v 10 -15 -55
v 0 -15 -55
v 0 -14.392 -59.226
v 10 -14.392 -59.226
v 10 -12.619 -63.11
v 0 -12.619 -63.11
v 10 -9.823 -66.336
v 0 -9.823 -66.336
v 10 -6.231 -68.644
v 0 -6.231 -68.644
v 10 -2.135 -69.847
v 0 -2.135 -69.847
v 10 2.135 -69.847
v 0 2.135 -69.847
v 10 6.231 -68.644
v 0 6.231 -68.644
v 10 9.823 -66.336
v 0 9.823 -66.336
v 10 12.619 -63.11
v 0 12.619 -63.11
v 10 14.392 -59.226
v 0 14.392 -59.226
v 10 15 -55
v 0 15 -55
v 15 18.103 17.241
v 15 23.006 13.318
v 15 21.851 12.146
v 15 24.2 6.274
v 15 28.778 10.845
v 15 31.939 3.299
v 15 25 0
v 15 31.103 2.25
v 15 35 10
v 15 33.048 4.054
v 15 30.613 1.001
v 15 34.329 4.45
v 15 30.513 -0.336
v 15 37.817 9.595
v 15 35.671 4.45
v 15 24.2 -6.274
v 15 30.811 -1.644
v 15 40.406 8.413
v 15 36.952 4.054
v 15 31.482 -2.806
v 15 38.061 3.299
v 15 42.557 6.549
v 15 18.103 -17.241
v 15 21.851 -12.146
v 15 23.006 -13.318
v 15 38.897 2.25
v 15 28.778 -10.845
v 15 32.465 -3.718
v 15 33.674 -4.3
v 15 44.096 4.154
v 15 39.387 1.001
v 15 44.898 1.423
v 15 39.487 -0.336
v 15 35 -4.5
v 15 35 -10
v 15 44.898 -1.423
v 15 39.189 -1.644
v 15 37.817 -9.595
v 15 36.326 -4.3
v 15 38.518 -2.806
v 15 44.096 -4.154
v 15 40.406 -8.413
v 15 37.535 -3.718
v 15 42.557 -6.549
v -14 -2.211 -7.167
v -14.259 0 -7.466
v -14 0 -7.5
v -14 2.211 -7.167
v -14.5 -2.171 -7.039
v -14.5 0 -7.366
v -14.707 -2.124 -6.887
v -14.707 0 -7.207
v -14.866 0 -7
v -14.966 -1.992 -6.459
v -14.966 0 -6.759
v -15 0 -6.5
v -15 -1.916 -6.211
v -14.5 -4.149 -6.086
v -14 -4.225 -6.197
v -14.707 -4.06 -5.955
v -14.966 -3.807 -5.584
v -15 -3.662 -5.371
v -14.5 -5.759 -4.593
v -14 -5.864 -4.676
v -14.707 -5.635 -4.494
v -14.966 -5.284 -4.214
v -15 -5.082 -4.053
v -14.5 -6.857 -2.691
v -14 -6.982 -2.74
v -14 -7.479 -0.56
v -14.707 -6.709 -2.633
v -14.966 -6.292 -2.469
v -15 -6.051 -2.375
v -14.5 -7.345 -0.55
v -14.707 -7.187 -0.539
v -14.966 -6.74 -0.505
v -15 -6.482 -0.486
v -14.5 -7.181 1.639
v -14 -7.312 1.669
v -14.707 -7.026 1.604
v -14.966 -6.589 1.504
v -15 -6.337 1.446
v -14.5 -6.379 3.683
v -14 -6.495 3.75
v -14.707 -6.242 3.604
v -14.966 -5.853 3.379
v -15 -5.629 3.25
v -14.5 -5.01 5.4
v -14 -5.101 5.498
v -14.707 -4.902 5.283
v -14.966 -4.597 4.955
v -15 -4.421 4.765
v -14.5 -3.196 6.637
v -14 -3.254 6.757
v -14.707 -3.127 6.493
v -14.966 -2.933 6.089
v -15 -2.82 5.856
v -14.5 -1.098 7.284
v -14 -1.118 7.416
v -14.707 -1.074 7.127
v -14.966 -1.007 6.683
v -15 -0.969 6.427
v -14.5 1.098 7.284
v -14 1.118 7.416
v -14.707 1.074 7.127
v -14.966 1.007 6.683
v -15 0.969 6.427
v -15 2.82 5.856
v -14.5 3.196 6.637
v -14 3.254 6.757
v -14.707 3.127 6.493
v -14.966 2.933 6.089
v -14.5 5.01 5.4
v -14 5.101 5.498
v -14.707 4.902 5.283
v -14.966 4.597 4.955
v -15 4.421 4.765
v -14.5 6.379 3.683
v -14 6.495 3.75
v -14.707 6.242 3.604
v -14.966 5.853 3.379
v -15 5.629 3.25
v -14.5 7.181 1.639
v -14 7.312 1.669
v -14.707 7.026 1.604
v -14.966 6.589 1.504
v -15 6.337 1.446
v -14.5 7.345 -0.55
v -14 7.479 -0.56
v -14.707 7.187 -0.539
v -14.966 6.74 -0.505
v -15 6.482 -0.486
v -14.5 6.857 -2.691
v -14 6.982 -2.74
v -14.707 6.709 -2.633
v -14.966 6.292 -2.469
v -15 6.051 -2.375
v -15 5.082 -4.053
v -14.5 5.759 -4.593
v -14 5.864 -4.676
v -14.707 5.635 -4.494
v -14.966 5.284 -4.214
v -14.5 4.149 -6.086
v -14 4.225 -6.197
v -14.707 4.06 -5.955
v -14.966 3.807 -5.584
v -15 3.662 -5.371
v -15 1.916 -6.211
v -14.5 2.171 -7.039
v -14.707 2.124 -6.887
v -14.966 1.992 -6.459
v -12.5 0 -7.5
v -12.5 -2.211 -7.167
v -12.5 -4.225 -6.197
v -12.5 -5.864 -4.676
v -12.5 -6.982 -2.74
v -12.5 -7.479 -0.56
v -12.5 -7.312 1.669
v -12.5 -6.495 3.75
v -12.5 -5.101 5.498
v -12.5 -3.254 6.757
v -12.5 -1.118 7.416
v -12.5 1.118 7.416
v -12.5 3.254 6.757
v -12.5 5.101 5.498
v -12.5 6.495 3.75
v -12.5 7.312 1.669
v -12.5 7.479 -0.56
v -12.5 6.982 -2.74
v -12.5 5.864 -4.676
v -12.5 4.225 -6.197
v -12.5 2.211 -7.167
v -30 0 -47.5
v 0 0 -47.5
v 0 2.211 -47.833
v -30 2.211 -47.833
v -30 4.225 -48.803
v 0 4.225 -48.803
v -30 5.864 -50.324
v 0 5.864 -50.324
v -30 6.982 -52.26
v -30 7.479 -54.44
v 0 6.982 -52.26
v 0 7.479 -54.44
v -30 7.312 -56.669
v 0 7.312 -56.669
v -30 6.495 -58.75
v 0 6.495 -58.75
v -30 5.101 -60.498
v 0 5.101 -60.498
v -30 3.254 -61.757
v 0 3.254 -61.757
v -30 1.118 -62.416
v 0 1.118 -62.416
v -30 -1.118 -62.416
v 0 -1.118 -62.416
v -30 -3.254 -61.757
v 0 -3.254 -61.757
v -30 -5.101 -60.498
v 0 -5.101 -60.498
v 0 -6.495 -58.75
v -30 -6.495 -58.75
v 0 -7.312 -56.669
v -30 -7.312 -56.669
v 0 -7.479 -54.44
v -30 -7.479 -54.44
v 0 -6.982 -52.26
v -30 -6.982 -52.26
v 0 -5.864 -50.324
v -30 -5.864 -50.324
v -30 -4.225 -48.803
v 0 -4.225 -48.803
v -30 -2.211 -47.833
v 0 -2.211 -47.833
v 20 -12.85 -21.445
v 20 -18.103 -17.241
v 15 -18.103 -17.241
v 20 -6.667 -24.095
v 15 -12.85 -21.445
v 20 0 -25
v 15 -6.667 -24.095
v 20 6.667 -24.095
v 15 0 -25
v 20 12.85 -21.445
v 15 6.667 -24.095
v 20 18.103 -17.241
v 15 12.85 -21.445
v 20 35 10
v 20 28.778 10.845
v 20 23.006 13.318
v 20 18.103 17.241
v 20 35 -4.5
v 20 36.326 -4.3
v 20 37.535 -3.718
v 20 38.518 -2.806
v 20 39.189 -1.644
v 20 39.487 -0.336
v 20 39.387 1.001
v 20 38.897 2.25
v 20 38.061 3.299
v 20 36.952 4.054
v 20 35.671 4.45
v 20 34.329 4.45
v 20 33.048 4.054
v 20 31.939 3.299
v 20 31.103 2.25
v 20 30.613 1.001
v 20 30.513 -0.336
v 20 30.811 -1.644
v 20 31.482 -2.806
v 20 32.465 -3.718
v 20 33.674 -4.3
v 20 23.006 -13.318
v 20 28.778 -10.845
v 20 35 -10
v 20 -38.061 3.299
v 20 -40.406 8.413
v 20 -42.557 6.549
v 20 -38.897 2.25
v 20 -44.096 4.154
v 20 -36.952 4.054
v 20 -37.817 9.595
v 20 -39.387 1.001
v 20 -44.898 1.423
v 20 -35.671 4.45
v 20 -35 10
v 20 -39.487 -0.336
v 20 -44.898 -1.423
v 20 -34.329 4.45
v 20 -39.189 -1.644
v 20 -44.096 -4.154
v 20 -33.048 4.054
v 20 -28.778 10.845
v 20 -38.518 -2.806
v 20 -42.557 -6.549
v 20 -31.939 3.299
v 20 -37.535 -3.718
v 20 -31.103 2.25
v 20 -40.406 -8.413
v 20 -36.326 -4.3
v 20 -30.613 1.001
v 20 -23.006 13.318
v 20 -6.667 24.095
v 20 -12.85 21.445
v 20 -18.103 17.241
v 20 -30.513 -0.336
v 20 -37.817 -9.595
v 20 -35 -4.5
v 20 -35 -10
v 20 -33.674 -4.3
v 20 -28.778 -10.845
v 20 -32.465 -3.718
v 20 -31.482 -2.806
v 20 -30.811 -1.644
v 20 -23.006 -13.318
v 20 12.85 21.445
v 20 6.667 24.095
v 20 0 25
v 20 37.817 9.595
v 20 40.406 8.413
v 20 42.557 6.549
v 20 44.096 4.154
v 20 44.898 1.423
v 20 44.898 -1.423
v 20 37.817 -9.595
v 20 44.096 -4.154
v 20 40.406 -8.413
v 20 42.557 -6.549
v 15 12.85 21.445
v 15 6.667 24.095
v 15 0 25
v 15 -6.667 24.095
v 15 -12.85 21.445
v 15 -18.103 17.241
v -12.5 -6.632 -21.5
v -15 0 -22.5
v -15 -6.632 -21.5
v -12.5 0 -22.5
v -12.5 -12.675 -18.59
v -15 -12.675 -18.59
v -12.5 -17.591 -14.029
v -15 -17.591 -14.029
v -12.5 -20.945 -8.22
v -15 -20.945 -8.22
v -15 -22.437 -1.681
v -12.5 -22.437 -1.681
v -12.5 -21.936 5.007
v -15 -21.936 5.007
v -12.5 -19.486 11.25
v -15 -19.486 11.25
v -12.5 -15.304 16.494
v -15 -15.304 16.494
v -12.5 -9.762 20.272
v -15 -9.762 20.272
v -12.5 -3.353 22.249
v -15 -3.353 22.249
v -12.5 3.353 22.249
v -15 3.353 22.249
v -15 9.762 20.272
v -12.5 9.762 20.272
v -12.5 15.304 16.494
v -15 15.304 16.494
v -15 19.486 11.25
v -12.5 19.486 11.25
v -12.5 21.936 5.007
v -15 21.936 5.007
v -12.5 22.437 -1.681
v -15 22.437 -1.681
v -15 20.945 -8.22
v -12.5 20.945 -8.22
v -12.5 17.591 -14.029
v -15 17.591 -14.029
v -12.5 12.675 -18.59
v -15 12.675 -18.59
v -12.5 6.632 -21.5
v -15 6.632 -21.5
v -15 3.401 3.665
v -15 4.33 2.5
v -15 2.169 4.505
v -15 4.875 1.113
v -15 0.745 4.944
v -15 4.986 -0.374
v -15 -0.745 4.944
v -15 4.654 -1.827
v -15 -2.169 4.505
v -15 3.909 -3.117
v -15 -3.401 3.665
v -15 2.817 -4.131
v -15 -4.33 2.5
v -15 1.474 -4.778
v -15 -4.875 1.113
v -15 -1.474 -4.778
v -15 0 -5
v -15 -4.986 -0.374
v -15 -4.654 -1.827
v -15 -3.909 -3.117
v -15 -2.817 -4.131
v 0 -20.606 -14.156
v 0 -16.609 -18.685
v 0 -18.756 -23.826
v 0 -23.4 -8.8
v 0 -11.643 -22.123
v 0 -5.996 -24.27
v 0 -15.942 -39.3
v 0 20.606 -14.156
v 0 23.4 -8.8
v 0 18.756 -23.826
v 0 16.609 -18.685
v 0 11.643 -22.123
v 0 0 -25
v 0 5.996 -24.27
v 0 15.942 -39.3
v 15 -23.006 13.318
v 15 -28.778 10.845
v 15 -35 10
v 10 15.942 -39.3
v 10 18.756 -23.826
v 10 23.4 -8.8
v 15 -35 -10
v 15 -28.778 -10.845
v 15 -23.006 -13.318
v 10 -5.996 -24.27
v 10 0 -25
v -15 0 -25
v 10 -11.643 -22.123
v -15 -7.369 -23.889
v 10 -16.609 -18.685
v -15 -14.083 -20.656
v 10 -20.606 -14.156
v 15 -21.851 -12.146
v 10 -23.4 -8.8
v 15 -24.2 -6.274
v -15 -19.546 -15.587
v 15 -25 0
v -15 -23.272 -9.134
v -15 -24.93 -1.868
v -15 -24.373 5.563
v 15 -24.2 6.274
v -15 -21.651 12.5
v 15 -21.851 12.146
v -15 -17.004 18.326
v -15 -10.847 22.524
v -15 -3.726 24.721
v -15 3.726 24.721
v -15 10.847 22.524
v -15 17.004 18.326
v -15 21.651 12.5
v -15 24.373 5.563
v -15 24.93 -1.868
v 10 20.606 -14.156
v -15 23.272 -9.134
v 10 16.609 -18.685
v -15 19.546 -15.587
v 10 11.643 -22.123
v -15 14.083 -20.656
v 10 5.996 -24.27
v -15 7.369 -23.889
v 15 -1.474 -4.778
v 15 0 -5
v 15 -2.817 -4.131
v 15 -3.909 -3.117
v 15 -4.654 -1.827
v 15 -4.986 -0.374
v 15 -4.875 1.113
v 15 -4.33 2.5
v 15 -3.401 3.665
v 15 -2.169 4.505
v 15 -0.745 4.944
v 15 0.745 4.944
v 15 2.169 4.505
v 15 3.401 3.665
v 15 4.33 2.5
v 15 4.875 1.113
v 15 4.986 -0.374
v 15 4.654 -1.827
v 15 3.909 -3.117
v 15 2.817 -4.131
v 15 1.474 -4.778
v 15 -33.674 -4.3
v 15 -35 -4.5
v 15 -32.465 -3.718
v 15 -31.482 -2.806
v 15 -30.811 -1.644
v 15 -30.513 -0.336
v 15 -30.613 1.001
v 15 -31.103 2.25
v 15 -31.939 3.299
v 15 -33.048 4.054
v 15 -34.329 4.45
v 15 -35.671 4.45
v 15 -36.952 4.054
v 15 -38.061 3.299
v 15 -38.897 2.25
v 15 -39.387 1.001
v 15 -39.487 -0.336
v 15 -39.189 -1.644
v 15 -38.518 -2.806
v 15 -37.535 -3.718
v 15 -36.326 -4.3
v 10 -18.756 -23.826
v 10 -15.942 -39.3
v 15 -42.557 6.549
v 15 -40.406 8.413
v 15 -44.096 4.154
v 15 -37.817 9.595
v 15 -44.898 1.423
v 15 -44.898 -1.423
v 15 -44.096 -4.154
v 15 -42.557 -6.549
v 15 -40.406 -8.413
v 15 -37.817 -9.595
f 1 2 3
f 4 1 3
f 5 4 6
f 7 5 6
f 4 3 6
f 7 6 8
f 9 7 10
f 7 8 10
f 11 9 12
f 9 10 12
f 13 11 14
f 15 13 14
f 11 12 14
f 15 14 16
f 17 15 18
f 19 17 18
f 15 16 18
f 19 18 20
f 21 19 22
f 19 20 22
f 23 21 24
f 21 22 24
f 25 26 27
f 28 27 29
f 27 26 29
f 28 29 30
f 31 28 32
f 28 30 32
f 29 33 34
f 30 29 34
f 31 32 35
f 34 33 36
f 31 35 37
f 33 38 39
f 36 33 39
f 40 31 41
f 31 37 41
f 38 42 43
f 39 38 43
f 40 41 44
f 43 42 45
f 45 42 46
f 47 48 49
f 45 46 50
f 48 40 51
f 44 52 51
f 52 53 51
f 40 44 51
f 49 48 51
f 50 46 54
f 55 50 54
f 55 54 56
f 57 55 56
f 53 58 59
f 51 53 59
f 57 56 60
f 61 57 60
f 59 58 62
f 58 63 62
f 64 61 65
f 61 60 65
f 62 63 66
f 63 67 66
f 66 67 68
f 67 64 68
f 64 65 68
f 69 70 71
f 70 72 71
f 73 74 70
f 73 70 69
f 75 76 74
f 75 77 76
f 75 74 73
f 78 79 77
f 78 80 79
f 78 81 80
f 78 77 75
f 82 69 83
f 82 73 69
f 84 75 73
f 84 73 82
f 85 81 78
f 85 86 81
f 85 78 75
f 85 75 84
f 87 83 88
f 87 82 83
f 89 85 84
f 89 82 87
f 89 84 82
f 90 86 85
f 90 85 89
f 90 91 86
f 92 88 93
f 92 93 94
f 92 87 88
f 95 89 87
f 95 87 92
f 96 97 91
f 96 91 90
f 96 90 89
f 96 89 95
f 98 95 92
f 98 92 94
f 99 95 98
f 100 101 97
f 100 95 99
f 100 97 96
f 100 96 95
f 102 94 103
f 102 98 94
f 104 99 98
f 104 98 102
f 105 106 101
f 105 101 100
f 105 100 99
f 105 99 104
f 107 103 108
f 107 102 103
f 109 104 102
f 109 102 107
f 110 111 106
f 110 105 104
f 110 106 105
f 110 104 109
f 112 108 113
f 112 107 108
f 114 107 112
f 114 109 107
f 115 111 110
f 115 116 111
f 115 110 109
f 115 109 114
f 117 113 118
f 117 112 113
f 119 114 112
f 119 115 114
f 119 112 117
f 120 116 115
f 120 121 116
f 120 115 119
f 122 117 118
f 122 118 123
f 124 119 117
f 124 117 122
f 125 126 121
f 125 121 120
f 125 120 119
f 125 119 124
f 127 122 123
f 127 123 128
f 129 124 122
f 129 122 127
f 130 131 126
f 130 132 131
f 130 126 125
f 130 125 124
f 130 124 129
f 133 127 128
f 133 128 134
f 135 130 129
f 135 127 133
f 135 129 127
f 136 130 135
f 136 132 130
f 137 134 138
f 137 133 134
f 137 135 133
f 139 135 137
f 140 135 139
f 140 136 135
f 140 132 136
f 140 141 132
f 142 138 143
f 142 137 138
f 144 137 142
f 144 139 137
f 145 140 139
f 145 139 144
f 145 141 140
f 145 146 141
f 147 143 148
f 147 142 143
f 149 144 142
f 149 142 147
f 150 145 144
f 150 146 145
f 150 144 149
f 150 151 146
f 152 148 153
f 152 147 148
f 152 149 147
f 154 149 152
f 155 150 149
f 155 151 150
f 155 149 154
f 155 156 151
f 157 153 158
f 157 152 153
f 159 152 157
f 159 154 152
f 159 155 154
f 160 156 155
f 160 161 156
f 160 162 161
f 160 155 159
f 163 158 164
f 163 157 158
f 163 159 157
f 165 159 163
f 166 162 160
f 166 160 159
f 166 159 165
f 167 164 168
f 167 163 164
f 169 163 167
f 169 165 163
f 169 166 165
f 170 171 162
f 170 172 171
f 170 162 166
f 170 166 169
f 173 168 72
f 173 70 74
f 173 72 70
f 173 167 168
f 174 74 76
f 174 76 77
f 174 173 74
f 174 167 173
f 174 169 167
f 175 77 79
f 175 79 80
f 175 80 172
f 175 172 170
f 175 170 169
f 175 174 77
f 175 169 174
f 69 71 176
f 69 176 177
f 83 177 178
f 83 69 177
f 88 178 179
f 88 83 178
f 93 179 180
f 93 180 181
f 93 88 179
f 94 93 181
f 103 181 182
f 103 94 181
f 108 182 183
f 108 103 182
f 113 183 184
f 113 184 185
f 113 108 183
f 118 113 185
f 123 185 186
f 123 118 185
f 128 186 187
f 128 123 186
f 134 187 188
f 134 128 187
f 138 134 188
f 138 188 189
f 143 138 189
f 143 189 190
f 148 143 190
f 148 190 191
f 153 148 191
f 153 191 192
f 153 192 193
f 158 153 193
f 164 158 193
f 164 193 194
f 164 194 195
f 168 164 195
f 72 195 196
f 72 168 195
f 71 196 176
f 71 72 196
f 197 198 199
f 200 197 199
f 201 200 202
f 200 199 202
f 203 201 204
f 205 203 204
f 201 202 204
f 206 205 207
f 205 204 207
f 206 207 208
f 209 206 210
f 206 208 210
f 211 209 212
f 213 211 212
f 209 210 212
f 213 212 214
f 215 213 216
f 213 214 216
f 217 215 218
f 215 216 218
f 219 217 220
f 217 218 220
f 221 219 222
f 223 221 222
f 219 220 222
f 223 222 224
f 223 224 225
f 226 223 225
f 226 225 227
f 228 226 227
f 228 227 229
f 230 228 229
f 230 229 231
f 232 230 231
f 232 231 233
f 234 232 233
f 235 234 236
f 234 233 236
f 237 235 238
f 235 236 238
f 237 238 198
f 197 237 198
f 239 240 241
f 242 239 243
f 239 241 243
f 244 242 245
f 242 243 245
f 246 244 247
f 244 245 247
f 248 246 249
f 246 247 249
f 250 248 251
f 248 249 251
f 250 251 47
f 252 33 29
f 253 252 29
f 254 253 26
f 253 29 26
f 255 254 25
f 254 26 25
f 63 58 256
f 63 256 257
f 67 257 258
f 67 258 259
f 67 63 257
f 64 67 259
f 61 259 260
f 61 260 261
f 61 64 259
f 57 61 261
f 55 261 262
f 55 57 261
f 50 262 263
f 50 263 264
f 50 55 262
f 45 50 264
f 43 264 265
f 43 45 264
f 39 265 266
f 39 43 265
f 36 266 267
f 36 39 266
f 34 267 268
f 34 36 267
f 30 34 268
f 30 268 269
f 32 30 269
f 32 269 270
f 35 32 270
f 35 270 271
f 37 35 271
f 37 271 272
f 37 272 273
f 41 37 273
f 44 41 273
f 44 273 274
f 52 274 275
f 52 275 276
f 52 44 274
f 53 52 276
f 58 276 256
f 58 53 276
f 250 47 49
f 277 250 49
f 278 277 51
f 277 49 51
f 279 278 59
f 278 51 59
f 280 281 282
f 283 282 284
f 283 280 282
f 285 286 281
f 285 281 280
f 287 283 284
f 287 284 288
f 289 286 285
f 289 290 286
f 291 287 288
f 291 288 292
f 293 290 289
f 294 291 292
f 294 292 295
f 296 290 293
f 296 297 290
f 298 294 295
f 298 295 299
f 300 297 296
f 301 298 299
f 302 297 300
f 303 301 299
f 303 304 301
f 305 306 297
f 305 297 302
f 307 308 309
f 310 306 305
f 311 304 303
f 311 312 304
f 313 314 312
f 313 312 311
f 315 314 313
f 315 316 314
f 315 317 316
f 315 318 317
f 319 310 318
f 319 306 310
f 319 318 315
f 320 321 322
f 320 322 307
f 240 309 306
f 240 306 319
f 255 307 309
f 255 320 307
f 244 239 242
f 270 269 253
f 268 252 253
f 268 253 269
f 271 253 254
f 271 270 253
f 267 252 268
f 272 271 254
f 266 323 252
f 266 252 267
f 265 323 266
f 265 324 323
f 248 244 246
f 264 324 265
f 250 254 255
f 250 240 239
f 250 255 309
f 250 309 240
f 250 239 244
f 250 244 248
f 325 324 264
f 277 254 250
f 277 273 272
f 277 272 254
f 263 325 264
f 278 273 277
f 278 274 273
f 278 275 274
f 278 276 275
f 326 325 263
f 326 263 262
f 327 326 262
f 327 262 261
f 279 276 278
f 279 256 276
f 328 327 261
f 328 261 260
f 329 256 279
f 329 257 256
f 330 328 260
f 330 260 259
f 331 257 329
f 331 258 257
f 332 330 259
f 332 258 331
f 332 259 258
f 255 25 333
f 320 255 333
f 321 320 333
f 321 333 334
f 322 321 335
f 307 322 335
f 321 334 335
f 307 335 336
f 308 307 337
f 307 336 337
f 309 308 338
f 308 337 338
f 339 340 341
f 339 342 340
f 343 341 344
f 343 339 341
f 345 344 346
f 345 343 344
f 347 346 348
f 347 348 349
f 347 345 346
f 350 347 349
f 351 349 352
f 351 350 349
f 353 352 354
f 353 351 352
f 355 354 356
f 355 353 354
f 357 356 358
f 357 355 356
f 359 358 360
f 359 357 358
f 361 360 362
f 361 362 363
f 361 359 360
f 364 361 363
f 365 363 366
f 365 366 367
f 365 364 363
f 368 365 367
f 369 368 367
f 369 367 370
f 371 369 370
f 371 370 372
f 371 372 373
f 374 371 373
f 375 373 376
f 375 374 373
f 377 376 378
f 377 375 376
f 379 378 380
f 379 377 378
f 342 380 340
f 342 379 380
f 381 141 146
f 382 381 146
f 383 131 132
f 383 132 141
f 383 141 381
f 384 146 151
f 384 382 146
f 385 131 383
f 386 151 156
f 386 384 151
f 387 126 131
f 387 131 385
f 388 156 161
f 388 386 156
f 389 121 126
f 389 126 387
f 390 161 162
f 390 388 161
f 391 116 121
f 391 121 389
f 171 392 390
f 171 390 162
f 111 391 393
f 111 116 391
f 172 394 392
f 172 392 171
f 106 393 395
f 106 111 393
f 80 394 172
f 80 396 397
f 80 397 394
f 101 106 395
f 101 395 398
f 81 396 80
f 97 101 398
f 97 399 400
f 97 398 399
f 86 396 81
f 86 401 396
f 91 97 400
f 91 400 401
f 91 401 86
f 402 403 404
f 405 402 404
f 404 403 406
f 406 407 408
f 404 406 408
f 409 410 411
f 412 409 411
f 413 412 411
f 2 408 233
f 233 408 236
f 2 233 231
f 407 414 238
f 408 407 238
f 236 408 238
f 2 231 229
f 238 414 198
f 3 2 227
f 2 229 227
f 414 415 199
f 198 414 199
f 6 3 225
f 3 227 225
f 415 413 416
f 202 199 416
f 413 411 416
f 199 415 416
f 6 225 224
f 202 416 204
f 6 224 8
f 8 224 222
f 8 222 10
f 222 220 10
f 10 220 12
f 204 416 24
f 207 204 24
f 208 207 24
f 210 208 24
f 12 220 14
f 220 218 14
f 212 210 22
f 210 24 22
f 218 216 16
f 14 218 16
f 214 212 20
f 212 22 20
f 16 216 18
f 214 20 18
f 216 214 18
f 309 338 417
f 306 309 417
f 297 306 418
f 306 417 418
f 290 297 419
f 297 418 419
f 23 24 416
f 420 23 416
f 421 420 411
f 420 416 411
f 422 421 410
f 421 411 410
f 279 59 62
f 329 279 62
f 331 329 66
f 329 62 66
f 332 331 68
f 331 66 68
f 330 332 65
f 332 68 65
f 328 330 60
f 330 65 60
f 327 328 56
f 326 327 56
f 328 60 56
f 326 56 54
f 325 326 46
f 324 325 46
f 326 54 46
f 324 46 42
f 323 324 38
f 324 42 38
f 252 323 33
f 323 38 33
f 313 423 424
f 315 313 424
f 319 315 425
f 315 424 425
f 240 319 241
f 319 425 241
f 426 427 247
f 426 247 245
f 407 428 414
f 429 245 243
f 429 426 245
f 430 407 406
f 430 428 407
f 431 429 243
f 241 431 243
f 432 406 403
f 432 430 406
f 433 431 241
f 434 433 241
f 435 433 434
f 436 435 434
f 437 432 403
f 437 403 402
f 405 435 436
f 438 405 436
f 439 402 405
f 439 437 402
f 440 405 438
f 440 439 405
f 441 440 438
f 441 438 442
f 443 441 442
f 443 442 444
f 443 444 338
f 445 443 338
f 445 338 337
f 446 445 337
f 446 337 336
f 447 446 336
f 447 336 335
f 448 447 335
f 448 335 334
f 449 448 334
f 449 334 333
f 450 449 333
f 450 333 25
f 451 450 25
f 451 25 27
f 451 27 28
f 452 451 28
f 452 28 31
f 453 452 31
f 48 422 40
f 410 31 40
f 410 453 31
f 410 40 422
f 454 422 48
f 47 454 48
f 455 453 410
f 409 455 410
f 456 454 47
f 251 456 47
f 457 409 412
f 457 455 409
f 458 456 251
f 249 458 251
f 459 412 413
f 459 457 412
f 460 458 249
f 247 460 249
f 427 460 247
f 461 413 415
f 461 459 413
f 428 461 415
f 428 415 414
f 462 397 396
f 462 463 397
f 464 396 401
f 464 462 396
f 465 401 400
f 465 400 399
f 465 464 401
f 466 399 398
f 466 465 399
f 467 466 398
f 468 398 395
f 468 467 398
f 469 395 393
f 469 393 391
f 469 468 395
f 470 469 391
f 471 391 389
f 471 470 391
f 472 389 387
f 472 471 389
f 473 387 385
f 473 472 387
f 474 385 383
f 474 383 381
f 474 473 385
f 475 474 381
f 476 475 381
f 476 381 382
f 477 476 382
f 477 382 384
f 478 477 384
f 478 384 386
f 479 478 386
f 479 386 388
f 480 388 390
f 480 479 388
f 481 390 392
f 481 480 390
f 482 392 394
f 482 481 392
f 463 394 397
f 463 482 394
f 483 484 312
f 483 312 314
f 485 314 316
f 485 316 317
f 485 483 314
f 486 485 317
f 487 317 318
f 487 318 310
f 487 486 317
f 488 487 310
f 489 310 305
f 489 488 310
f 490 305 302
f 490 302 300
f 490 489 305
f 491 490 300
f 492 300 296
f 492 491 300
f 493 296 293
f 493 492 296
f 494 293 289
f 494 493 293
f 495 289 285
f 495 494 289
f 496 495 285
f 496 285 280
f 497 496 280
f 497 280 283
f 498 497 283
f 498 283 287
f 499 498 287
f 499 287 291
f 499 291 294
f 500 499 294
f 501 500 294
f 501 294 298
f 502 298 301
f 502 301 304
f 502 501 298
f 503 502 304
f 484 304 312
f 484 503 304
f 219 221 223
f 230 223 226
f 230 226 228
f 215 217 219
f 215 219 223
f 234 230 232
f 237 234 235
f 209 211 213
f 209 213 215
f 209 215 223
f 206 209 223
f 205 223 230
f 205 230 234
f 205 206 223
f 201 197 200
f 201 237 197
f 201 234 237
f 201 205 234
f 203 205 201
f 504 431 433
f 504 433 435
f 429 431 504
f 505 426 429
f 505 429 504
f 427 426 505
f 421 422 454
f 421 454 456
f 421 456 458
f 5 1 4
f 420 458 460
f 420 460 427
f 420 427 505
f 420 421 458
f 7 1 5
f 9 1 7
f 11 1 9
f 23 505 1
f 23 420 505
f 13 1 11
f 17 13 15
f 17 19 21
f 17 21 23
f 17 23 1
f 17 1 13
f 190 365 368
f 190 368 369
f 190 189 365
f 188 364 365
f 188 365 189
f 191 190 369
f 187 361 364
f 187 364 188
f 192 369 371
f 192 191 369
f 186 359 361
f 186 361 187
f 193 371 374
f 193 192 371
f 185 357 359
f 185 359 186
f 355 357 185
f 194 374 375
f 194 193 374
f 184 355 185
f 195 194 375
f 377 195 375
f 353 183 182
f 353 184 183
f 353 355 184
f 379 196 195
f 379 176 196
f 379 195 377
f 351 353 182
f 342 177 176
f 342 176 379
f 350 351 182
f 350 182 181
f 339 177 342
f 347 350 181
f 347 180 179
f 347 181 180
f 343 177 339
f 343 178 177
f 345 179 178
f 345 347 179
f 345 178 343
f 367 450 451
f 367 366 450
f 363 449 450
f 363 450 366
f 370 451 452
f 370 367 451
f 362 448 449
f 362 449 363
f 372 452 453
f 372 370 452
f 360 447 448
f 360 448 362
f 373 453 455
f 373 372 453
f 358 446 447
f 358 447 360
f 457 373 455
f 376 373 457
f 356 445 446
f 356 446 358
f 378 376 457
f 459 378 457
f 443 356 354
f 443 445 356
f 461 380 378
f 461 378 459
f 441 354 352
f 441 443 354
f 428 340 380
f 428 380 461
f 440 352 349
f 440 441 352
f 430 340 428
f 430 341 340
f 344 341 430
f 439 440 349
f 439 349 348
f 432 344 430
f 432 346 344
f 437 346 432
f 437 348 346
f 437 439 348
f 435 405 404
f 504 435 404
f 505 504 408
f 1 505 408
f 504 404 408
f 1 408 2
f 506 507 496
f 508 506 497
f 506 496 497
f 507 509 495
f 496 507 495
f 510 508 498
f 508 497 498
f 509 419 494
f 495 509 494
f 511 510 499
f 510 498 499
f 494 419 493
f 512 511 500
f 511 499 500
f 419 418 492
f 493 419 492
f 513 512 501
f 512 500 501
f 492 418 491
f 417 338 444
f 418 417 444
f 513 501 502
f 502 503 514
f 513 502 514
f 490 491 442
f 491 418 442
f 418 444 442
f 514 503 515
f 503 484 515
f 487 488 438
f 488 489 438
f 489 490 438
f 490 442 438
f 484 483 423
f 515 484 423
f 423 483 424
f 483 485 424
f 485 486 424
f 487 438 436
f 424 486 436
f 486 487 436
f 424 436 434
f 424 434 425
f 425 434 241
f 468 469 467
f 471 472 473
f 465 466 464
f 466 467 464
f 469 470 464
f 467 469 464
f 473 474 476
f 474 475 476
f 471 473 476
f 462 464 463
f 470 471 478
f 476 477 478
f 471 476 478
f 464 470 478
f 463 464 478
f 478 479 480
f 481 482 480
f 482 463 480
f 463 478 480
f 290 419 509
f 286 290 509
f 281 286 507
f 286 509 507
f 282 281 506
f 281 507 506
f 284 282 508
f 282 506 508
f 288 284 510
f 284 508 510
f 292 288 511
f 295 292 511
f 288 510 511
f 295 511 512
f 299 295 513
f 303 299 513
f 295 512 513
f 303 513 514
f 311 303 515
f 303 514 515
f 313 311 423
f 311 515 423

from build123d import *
from build123d.topology import SkipClean

# Parameters (mm, degrees)
FILLET1_R           = 1
SKETCH2_R           = 4.5
BOSS_EXTRUDE2_DEPTH = 5
BOSS_EXTRUDE3_DEPTH = 10
SKETCH4_R           = 7.5
BOSS_EXTRUDE4_DEPTH = 30


with BuildPart() as part:
    # Sketch1 → Revolve1 (revolve)
    with BuildSketch(Plane.XY, mode=Mode.PRIVATE) as revolve1_sk:
        Polygon((15, 25), (-15, 25), (-15, 22.5), (-12.5, 22.5), (-12.5, 7.5), (-15, 7.5), (-15, 5), (15, 5), align=None)
    revolve(revolve1_sk.sketch.rotate(Axis((0, 0, 0), (-1, 0, 0)), 90), axis=Axis((0, 0, 0), (-1, 0, 0)))

    # Fillet1
    fillet1_edges = [part.edges().sort_by_distance(p)[0] for p in [
        (-15, 0, 7.5),
    ]]
    fillet(fillet1_edges, radius=FILLET1_R)

    # Sketch2 → Boss-Extrude2 (add)
    with SkipClean():  # the faces are left unmerged after this step: merging them gives an invalid solid
        with BuildSketch(Plane(origin=(15, 0, 0), x_dir=(0, 0, -1), z_dir=(1, 0, 0))):
            with BuildLine():
                ThreePointArc((10, 35), (0, 45), (-10, 35))
                ThreePointArc((-10, 35), (-11.886615966, 25.8085497), (-17.24137931, 18.103448276))
                ThreePointArc((-17.24137931, 18.103448276), (-25, 0), (-17.24137931, -18.103448276))
                ThreePointArc((-17.24137931, -18.103448276), (-11.886615966, -25.8085497), (-10, -35))
                ThreePointArc((-10, -35), (0, -45), (10, -35))
                ThreePointArc((10, -35), (11.886615966, -25.8085497), (17.24137931, -18.103448276))
                ThreePointArc((17.24137931, -18.103448276), (25, 0), (17.24137931, 18.103448276))
                ThreePointArc((17.24137931, 18.103448276), (11.886615966, 25.8085497), (10, 35))
            make_face()
            with Locations((0, 35)):
                Circle(SKETCH2_R, mode=Mode.SUBTRACT)
            with Locations((0, -35)):
                Circle(SKETCH2_R, mode=Mode.SUBTRACT)
        extrude(amount=BOSS_EXTRUDE2_DEPTH)

    # Sketch3 → Boss-Extrude3 (add)
    with SkipClean():  # the faces are left unmerged after this step: merging them gives an invalid solid
        with BuildSketch(Plane(origin=(0, 0, 0), x_dir=(0, 0, -1), z_dir=(1, 0, 0))):
            with BuildLine():
                Line((8.8, 23.4), (8.8, -23.4))
                ThreePointArc((8.8, -23.4), (31.521286236, -17.117074299), (55, -15))
                ThreePointArc((55, -15), (70, 0), (55, 15))
                ThreePointArc((55, 15), (31.521286236, 17.117074299), (8.8, 23.4))
            make_face()
        extrude(amount=BOSS_EXTRUDE3_DEPTH)

    # Sketch4 → Boss-Extrude4 (add)
    with SkipClean():  # the faces are left unmerged after this step: merging them gives an invalid solid
        with BuildSketch(Plane.ZY):
            with Locations((-55, 0)):
                Circle(SKETCH4_R)
        extrude(amount=BOSS_EXTRUDE4_DEPTH)


solid = part.part
